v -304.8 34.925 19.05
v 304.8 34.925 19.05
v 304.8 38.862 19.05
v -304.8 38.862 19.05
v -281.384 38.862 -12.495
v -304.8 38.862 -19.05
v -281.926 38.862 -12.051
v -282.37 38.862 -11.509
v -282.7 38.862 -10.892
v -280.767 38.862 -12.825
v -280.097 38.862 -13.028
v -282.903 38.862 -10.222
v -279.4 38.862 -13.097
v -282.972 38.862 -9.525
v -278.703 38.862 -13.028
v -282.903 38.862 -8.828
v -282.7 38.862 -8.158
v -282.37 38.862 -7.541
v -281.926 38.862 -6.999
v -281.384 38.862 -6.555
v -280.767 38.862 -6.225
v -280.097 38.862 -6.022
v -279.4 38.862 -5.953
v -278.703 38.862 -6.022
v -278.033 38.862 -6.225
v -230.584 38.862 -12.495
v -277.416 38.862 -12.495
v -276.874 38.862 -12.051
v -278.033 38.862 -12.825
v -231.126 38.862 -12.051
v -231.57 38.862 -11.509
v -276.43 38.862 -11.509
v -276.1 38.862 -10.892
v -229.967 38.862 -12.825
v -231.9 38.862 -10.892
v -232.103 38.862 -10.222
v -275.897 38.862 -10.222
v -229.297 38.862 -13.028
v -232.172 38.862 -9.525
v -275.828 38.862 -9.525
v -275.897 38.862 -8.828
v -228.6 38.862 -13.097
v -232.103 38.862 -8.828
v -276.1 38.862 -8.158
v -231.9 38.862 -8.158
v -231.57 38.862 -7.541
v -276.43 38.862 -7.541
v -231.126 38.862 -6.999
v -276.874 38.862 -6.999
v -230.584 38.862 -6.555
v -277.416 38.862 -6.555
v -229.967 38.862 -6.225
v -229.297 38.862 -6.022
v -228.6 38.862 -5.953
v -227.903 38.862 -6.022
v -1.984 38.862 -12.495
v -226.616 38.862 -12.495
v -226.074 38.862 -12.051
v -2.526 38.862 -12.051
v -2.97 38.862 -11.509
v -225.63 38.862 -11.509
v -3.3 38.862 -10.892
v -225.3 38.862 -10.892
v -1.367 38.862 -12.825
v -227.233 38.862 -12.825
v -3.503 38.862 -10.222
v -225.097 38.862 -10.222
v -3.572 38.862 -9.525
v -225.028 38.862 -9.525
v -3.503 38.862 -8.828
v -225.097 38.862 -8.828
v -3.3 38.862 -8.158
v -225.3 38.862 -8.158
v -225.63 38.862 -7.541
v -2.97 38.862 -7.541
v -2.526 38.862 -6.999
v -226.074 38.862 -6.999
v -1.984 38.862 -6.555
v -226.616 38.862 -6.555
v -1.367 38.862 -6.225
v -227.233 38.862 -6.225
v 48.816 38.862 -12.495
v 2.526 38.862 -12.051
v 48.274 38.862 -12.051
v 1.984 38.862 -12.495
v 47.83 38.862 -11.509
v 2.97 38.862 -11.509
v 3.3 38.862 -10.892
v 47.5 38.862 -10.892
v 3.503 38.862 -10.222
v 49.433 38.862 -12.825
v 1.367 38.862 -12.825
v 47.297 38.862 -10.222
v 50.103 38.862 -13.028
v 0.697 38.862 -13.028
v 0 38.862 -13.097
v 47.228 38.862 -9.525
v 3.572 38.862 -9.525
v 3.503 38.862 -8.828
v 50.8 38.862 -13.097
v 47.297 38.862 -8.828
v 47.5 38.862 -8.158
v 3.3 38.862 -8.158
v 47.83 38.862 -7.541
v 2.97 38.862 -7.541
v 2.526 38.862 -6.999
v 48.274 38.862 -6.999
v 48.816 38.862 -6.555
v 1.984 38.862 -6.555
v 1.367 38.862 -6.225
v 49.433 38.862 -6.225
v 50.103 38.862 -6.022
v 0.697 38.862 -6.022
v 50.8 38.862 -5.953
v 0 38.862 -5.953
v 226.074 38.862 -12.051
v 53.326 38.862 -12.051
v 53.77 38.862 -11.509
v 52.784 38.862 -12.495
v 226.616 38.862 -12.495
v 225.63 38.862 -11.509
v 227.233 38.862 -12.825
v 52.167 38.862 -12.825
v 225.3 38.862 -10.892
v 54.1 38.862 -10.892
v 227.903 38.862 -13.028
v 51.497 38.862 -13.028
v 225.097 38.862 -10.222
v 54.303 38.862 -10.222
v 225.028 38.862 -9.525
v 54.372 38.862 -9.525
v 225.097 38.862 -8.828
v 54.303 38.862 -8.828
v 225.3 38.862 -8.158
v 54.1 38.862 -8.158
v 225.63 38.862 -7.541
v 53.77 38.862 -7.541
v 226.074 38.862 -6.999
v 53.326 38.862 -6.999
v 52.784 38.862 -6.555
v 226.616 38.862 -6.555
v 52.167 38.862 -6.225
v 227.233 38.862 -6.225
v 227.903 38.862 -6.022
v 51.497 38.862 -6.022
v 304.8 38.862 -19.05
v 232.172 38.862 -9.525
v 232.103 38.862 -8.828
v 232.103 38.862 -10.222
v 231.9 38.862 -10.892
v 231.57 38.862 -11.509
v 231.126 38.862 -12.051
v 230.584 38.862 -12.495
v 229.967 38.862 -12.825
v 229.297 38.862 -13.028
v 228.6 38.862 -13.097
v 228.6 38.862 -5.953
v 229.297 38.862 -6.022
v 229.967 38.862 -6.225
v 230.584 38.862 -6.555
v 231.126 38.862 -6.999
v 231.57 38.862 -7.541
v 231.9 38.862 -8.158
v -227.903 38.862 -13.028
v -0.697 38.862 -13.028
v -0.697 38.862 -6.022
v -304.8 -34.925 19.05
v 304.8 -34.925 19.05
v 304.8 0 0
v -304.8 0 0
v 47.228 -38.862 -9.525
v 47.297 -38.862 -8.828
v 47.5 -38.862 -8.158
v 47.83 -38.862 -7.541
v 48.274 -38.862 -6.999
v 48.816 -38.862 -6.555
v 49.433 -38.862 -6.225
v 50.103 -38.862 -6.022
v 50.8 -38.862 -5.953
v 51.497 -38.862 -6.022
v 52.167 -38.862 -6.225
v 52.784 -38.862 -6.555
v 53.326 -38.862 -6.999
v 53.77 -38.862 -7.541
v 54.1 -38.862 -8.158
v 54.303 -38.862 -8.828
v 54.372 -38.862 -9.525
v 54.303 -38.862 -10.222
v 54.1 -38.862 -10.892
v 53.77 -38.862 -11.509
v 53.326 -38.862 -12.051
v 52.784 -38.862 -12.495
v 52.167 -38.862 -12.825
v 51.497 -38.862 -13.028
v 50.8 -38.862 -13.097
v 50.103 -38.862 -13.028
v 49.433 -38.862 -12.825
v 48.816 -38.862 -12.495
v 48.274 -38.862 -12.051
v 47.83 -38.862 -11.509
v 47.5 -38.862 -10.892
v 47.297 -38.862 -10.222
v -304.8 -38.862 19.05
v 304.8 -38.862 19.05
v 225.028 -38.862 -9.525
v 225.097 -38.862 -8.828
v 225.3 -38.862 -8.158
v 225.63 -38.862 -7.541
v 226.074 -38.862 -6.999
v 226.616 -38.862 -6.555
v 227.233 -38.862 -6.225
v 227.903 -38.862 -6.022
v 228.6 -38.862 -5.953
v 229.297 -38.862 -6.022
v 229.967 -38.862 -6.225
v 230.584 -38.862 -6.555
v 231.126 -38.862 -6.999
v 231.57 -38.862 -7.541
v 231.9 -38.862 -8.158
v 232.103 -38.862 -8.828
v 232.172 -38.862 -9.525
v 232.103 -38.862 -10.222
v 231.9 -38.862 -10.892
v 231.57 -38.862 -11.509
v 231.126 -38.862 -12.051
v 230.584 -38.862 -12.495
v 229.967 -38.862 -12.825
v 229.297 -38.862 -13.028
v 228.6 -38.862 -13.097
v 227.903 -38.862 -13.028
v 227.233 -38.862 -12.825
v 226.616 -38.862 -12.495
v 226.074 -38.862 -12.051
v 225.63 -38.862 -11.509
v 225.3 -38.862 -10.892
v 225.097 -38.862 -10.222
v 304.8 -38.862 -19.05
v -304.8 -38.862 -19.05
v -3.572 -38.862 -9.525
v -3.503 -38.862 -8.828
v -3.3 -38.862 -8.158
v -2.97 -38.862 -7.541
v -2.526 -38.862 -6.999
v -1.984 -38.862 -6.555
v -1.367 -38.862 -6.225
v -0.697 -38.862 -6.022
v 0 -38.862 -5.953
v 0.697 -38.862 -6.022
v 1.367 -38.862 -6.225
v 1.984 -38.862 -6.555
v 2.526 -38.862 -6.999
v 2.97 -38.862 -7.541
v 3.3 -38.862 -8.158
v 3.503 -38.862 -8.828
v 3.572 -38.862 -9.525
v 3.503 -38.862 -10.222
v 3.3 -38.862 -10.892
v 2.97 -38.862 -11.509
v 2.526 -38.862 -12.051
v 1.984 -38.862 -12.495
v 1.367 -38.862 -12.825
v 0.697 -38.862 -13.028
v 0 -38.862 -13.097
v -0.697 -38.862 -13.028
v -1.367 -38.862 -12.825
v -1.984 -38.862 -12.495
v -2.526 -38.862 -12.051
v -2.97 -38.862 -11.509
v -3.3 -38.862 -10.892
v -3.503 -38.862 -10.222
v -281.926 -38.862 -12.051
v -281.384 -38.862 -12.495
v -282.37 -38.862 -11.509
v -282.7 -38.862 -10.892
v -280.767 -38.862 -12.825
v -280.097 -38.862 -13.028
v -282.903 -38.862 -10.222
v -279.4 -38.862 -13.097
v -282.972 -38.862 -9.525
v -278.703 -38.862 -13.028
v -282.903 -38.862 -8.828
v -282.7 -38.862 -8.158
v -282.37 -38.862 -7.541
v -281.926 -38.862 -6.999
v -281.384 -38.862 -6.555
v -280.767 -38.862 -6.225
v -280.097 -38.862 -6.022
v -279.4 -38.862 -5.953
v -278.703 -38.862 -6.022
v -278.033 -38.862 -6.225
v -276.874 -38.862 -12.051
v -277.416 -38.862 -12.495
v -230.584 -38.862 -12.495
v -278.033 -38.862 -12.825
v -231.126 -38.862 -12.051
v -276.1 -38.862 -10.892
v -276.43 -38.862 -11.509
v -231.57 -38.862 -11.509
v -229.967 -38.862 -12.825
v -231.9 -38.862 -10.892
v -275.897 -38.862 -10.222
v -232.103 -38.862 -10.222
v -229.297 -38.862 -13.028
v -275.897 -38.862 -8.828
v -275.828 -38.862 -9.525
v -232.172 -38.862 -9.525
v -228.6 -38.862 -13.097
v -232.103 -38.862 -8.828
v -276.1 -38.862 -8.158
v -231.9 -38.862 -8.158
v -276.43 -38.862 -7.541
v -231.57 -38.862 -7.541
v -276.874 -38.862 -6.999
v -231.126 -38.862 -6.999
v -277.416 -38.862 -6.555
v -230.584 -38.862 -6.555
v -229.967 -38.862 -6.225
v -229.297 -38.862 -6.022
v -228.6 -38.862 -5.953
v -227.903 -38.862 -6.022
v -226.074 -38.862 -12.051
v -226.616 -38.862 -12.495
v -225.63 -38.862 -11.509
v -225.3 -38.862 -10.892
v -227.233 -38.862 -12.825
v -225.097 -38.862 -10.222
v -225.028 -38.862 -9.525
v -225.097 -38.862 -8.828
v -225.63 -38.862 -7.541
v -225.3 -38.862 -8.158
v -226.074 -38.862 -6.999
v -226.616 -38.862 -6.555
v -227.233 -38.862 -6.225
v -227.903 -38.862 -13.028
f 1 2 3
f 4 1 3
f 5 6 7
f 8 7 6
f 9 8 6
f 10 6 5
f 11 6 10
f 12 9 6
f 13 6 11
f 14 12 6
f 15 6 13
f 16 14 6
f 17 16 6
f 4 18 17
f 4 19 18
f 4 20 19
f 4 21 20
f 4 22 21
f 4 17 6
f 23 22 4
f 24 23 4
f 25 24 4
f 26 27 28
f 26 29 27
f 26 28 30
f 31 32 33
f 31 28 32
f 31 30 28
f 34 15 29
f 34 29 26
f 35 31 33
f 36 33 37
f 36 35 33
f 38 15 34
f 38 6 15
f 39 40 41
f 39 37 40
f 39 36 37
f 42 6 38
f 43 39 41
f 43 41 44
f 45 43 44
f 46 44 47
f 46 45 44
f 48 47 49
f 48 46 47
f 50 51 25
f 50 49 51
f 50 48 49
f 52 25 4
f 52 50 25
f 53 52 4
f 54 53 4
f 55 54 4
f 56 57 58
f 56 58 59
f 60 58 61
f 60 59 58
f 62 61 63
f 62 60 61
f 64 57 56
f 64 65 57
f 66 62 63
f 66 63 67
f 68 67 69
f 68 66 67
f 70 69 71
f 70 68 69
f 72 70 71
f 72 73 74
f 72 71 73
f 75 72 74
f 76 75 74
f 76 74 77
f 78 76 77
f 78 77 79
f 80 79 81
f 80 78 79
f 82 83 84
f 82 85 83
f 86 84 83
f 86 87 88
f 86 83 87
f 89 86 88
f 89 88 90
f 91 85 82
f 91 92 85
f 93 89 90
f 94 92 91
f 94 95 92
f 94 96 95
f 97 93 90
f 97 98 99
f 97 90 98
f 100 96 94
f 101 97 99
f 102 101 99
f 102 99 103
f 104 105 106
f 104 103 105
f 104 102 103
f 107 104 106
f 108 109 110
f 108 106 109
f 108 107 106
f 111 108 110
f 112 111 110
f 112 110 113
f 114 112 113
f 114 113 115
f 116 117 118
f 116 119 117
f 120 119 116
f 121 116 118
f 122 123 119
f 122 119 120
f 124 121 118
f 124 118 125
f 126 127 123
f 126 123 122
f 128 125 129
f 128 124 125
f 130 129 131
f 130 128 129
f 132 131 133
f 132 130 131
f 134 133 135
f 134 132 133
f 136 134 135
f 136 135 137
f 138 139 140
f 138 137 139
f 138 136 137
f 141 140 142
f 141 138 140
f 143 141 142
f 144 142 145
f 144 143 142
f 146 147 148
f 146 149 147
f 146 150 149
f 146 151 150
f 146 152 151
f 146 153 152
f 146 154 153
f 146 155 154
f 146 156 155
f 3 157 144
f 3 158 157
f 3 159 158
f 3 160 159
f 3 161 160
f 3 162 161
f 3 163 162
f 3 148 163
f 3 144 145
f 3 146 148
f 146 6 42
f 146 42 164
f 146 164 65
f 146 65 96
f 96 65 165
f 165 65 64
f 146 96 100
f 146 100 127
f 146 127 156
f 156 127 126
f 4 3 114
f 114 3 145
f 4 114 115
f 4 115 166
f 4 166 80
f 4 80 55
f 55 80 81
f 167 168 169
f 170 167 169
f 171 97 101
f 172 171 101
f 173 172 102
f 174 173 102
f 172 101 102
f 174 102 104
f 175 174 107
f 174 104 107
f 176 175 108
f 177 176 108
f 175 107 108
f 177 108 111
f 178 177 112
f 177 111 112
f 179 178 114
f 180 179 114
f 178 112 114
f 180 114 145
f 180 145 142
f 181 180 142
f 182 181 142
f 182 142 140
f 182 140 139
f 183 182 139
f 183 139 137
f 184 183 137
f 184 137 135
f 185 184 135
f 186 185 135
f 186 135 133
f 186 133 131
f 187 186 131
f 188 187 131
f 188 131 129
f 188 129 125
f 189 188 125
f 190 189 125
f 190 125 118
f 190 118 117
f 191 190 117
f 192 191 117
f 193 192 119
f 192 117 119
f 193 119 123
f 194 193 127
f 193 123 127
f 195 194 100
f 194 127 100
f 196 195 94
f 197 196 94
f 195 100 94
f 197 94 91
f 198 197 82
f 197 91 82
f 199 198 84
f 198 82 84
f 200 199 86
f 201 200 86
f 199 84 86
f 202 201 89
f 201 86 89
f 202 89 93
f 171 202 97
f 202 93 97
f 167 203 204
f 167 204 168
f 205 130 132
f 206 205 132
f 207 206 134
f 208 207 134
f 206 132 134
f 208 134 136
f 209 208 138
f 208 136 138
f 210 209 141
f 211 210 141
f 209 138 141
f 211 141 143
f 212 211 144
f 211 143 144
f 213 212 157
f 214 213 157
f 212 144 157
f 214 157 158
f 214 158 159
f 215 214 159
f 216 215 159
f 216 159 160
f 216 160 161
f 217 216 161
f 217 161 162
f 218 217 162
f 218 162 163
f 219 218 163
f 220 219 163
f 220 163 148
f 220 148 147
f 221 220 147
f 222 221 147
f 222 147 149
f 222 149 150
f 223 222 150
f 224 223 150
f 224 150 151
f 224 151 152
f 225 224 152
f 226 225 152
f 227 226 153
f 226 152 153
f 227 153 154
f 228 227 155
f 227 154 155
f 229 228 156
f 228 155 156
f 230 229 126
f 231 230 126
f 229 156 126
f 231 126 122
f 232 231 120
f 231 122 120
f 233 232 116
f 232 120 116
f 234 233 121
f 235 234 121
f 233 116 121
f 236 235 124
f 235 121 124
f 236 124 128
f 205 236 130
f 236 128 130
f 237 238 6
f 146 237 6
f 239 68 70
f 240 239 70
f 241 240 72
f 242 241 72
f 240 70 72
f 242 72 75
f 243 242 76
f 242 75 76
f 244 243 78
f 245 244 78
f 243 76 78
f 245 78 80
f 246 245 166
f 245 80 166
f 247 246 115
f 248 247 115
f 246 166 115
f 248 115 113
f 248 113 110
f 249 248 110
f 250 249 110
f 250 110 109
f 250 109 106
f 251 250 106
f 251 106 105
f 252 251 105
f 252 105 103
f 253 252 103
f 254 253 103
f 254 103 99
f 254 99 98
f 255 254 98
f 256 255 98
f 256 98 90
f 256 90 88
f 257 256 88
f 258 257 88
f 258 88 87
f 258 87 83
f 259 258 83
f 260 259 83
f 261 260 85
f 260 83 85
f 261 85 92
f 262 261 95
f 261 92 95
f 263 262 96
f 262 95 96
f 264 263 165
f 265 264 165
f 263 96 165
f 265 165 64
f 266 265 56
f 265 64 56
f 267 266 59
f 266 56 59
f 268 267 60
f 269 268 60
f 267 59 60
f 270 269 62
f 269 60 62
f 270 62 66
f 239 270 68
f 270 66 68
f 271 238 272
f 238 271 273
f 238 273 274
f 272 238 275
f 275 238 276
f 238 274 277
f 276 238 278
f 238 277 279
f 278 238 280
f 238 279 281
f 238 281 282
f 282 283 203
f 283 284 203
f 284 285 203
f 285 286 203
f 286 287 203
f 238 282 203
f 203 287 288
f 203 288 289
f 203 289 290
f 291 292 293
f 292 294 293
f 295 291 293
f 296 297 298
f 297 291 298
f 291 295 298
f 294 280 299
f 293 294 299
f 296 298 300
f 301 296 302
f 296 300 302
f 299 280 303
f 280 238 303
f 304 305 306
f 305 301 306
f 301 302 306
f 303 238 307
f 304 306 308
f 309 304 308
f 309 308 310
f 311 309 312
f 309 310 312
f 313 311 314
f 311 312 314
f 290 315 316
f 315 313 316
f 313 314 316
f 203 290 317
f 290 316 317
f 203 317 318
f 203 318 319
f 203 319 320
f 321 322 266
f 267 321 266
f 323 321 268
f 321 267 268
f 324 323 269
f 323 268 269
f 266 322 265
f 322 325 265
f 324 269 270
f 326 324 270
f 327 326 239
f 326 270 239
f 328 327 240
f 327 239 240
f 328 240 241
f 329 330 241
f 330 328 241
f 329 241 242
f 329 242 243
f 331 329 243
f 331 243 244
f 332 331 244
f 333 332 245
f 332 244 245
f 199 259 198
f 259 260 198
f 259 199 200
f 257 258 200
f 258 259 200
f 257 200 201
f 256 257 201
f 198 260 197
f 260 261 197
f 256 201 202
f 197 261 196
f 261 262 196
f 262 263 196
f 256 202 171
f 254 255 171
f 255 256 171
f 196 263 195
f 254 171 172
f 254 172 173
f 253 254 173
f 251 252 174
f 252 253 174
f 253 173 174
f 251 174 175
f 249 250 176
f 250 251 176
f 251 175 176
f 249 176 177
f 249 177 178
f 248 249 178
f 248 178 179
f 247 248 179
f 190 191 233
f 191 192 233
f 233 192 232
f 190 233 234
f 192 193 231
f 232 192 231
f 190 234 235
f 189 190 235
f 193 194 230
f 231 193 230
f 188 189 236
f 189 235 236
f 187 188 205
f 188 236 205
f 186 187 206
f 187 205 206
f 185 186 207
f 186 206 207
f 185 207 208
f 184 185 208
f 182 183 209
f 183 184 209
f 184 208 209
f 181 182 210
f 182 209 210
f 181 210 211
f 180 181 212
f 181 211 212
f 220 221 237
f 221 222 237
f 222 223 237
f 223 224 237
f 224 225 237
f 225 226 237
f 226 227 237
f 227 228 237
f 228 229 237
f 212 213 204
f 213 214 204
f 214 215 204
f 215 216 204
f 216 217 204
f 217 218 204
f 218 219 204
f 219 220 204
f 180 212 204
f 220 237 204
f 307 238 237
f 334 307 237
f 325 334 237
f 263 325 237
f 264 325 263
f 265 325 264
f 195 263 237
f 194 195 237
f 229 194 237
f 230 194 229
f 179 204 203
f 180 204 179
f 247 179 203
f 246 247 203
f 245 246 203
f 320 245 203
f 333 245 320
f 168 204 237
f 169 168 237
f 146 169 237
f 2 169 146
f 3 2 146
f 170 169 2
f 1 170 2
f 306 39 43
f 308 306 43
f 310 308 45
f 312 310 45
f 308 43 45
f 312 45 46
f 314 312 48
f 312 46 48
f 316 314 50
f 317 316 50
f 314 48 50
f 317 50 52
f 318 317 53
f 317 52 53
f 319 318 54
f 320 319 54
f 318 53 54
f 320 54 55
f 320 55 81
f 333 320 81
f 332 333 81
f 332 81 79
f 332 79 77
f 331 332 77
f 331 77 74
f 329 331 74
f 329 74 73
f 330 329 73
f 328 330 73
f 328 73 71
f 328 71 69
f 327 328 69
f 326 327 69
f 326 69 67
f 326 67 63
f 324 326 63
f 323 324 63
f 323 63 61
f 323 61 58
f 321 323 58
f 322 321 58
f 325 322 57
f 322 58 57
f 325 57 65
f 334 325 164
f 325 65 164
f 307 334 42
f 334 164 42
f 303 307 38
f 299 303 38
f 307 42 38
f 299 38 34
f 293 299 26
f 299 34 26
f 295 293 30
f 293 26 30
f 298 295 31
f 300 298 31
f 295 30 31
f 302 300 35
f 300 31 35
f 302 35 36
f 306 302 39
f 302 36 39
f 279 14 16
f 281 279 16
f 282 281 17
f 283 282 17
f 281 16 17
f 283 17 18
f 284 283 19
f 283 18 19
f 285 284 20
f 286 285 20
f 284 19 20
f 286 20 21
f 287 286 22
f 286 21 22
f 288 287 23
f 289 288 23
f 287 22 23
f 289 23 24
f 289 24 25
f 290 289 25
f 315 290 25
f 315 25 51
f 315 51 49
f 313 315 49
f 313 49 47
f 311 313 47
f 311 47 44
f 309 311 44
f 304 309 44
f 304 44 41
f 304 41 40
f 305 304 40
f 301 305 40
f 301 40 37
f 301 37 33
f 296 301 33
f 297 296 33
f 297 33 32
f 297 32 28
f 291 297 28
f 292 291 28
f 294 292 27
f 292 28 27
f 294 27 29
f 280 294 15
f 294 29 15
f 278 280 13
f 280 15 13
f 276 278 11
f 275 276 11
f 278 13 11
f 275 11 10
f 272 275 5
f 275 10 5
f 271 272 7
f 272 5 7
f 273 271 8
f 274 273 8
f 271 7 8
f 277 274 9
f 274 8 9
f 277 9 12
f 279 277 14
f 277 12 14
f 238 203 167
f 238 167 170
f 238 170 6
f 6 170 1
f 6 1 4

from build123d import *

# Parameters (mm, degrees)
F0_W     = 77.724
F0_H     = 38.1
F1_DEPTH = 304.8
F3_DEPTH = 609.601
F5_D     = 7.14375


with BuildPart() as f1:
    # F0 (on Right) → F1 (new body, symmetric)
    with BuildSketch(Plane.YZ):
        Rectangle(F0_W, F0_H)
    extrude(amount=F1_DEPTH, both=True)

    # F2 (on face) → F3 (cut, through all)
    with BuildSketch(Plane.YZ.offset(304.8)):
        Polygon((34.925, 19.05), (-34.925, 19.05), (0, 0), align=None)
    extrude(amount=-F3_DEPTH, mode=Mode.SUBTRACT)

    # F5 (through all)
    with Locations(Plane.XZ.offset(38.862)):
        with Locations((-228.6, -9.525), (0, -9.525), (228.6, -9.525), (-279.4, -9.525), (50.8, -9.525)):
            Hole(F5_D / 2)


solid = f1.part
